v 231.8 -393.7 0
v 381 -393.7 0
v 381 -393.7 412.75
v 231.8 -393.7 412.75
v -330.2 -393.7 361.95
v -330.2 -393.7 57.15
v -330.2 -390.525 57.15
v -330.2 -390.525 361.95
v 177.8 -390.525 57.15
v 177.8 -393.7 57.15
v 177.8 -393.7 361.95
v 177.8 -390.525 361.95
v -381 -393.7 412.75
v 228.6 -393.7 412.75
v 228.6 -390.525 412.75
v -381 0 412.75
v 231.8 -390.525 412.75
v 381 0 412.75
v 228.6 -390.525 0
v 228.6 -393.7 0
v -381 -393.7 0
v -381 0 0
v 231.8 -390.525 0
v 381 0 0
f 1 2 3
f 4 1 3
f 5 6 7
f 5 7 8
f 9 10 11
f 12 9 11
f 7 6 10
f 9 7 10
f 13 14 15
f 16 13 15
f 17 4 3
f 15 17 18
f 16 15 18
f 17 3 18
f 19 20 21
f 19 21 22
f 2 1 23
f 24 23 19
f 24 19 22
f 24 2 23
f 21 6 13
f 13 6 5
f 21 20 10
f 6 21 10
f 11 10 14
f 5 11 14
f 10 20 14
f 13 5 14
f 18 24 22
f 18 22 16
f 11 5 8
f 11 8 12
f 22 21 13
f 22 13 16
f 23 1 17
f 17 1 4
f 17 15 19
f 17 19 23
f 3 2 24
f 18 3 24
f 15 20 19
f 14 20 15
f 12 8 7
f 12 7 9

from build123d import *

# Parameters (mm, degrees)
F0_W     = 393.7
F0_H     = 412.75
F1_DEPTH = 381
F2_W     = 508
F2_H     = 304.8
F3_DEPTH = 3.175
F4_W     = 3.2004
F4_H     = 563.479573
F5_DEPTH = 3.175


with BuildPart() as f1:
    # F0 (on Right) → F1 (new body, symmetric)
    with BuildSketch(Plane.YZ):
        with Locations((-196.85, 206.375)):
            Rectangle(F0_W, F0_H)
    extrude(amount=F1_DEPTH, both=True)

    # F2 (on face) → F3 (cut)
    with BuildSketch(Plane.XZ.offset(393.7)):
        with Locations((-76.2, 209.55)):
            Rectangle(F2_W, F2_H)
    extrude(amount=-F3_DEPTH, mode=Mode.SUBTRACT)

    # F4 (on face) → F5 (cut)
    with BuildSketch(Plane.XZ.offset(393.7)):
        with Locations((230.2002, 202.011388)):
            Rectangle(F4_W, F4_H)
    extrude(amount=-F5_DEPTH, mode=Mode.SUBTRACT)


solid = f1.part
